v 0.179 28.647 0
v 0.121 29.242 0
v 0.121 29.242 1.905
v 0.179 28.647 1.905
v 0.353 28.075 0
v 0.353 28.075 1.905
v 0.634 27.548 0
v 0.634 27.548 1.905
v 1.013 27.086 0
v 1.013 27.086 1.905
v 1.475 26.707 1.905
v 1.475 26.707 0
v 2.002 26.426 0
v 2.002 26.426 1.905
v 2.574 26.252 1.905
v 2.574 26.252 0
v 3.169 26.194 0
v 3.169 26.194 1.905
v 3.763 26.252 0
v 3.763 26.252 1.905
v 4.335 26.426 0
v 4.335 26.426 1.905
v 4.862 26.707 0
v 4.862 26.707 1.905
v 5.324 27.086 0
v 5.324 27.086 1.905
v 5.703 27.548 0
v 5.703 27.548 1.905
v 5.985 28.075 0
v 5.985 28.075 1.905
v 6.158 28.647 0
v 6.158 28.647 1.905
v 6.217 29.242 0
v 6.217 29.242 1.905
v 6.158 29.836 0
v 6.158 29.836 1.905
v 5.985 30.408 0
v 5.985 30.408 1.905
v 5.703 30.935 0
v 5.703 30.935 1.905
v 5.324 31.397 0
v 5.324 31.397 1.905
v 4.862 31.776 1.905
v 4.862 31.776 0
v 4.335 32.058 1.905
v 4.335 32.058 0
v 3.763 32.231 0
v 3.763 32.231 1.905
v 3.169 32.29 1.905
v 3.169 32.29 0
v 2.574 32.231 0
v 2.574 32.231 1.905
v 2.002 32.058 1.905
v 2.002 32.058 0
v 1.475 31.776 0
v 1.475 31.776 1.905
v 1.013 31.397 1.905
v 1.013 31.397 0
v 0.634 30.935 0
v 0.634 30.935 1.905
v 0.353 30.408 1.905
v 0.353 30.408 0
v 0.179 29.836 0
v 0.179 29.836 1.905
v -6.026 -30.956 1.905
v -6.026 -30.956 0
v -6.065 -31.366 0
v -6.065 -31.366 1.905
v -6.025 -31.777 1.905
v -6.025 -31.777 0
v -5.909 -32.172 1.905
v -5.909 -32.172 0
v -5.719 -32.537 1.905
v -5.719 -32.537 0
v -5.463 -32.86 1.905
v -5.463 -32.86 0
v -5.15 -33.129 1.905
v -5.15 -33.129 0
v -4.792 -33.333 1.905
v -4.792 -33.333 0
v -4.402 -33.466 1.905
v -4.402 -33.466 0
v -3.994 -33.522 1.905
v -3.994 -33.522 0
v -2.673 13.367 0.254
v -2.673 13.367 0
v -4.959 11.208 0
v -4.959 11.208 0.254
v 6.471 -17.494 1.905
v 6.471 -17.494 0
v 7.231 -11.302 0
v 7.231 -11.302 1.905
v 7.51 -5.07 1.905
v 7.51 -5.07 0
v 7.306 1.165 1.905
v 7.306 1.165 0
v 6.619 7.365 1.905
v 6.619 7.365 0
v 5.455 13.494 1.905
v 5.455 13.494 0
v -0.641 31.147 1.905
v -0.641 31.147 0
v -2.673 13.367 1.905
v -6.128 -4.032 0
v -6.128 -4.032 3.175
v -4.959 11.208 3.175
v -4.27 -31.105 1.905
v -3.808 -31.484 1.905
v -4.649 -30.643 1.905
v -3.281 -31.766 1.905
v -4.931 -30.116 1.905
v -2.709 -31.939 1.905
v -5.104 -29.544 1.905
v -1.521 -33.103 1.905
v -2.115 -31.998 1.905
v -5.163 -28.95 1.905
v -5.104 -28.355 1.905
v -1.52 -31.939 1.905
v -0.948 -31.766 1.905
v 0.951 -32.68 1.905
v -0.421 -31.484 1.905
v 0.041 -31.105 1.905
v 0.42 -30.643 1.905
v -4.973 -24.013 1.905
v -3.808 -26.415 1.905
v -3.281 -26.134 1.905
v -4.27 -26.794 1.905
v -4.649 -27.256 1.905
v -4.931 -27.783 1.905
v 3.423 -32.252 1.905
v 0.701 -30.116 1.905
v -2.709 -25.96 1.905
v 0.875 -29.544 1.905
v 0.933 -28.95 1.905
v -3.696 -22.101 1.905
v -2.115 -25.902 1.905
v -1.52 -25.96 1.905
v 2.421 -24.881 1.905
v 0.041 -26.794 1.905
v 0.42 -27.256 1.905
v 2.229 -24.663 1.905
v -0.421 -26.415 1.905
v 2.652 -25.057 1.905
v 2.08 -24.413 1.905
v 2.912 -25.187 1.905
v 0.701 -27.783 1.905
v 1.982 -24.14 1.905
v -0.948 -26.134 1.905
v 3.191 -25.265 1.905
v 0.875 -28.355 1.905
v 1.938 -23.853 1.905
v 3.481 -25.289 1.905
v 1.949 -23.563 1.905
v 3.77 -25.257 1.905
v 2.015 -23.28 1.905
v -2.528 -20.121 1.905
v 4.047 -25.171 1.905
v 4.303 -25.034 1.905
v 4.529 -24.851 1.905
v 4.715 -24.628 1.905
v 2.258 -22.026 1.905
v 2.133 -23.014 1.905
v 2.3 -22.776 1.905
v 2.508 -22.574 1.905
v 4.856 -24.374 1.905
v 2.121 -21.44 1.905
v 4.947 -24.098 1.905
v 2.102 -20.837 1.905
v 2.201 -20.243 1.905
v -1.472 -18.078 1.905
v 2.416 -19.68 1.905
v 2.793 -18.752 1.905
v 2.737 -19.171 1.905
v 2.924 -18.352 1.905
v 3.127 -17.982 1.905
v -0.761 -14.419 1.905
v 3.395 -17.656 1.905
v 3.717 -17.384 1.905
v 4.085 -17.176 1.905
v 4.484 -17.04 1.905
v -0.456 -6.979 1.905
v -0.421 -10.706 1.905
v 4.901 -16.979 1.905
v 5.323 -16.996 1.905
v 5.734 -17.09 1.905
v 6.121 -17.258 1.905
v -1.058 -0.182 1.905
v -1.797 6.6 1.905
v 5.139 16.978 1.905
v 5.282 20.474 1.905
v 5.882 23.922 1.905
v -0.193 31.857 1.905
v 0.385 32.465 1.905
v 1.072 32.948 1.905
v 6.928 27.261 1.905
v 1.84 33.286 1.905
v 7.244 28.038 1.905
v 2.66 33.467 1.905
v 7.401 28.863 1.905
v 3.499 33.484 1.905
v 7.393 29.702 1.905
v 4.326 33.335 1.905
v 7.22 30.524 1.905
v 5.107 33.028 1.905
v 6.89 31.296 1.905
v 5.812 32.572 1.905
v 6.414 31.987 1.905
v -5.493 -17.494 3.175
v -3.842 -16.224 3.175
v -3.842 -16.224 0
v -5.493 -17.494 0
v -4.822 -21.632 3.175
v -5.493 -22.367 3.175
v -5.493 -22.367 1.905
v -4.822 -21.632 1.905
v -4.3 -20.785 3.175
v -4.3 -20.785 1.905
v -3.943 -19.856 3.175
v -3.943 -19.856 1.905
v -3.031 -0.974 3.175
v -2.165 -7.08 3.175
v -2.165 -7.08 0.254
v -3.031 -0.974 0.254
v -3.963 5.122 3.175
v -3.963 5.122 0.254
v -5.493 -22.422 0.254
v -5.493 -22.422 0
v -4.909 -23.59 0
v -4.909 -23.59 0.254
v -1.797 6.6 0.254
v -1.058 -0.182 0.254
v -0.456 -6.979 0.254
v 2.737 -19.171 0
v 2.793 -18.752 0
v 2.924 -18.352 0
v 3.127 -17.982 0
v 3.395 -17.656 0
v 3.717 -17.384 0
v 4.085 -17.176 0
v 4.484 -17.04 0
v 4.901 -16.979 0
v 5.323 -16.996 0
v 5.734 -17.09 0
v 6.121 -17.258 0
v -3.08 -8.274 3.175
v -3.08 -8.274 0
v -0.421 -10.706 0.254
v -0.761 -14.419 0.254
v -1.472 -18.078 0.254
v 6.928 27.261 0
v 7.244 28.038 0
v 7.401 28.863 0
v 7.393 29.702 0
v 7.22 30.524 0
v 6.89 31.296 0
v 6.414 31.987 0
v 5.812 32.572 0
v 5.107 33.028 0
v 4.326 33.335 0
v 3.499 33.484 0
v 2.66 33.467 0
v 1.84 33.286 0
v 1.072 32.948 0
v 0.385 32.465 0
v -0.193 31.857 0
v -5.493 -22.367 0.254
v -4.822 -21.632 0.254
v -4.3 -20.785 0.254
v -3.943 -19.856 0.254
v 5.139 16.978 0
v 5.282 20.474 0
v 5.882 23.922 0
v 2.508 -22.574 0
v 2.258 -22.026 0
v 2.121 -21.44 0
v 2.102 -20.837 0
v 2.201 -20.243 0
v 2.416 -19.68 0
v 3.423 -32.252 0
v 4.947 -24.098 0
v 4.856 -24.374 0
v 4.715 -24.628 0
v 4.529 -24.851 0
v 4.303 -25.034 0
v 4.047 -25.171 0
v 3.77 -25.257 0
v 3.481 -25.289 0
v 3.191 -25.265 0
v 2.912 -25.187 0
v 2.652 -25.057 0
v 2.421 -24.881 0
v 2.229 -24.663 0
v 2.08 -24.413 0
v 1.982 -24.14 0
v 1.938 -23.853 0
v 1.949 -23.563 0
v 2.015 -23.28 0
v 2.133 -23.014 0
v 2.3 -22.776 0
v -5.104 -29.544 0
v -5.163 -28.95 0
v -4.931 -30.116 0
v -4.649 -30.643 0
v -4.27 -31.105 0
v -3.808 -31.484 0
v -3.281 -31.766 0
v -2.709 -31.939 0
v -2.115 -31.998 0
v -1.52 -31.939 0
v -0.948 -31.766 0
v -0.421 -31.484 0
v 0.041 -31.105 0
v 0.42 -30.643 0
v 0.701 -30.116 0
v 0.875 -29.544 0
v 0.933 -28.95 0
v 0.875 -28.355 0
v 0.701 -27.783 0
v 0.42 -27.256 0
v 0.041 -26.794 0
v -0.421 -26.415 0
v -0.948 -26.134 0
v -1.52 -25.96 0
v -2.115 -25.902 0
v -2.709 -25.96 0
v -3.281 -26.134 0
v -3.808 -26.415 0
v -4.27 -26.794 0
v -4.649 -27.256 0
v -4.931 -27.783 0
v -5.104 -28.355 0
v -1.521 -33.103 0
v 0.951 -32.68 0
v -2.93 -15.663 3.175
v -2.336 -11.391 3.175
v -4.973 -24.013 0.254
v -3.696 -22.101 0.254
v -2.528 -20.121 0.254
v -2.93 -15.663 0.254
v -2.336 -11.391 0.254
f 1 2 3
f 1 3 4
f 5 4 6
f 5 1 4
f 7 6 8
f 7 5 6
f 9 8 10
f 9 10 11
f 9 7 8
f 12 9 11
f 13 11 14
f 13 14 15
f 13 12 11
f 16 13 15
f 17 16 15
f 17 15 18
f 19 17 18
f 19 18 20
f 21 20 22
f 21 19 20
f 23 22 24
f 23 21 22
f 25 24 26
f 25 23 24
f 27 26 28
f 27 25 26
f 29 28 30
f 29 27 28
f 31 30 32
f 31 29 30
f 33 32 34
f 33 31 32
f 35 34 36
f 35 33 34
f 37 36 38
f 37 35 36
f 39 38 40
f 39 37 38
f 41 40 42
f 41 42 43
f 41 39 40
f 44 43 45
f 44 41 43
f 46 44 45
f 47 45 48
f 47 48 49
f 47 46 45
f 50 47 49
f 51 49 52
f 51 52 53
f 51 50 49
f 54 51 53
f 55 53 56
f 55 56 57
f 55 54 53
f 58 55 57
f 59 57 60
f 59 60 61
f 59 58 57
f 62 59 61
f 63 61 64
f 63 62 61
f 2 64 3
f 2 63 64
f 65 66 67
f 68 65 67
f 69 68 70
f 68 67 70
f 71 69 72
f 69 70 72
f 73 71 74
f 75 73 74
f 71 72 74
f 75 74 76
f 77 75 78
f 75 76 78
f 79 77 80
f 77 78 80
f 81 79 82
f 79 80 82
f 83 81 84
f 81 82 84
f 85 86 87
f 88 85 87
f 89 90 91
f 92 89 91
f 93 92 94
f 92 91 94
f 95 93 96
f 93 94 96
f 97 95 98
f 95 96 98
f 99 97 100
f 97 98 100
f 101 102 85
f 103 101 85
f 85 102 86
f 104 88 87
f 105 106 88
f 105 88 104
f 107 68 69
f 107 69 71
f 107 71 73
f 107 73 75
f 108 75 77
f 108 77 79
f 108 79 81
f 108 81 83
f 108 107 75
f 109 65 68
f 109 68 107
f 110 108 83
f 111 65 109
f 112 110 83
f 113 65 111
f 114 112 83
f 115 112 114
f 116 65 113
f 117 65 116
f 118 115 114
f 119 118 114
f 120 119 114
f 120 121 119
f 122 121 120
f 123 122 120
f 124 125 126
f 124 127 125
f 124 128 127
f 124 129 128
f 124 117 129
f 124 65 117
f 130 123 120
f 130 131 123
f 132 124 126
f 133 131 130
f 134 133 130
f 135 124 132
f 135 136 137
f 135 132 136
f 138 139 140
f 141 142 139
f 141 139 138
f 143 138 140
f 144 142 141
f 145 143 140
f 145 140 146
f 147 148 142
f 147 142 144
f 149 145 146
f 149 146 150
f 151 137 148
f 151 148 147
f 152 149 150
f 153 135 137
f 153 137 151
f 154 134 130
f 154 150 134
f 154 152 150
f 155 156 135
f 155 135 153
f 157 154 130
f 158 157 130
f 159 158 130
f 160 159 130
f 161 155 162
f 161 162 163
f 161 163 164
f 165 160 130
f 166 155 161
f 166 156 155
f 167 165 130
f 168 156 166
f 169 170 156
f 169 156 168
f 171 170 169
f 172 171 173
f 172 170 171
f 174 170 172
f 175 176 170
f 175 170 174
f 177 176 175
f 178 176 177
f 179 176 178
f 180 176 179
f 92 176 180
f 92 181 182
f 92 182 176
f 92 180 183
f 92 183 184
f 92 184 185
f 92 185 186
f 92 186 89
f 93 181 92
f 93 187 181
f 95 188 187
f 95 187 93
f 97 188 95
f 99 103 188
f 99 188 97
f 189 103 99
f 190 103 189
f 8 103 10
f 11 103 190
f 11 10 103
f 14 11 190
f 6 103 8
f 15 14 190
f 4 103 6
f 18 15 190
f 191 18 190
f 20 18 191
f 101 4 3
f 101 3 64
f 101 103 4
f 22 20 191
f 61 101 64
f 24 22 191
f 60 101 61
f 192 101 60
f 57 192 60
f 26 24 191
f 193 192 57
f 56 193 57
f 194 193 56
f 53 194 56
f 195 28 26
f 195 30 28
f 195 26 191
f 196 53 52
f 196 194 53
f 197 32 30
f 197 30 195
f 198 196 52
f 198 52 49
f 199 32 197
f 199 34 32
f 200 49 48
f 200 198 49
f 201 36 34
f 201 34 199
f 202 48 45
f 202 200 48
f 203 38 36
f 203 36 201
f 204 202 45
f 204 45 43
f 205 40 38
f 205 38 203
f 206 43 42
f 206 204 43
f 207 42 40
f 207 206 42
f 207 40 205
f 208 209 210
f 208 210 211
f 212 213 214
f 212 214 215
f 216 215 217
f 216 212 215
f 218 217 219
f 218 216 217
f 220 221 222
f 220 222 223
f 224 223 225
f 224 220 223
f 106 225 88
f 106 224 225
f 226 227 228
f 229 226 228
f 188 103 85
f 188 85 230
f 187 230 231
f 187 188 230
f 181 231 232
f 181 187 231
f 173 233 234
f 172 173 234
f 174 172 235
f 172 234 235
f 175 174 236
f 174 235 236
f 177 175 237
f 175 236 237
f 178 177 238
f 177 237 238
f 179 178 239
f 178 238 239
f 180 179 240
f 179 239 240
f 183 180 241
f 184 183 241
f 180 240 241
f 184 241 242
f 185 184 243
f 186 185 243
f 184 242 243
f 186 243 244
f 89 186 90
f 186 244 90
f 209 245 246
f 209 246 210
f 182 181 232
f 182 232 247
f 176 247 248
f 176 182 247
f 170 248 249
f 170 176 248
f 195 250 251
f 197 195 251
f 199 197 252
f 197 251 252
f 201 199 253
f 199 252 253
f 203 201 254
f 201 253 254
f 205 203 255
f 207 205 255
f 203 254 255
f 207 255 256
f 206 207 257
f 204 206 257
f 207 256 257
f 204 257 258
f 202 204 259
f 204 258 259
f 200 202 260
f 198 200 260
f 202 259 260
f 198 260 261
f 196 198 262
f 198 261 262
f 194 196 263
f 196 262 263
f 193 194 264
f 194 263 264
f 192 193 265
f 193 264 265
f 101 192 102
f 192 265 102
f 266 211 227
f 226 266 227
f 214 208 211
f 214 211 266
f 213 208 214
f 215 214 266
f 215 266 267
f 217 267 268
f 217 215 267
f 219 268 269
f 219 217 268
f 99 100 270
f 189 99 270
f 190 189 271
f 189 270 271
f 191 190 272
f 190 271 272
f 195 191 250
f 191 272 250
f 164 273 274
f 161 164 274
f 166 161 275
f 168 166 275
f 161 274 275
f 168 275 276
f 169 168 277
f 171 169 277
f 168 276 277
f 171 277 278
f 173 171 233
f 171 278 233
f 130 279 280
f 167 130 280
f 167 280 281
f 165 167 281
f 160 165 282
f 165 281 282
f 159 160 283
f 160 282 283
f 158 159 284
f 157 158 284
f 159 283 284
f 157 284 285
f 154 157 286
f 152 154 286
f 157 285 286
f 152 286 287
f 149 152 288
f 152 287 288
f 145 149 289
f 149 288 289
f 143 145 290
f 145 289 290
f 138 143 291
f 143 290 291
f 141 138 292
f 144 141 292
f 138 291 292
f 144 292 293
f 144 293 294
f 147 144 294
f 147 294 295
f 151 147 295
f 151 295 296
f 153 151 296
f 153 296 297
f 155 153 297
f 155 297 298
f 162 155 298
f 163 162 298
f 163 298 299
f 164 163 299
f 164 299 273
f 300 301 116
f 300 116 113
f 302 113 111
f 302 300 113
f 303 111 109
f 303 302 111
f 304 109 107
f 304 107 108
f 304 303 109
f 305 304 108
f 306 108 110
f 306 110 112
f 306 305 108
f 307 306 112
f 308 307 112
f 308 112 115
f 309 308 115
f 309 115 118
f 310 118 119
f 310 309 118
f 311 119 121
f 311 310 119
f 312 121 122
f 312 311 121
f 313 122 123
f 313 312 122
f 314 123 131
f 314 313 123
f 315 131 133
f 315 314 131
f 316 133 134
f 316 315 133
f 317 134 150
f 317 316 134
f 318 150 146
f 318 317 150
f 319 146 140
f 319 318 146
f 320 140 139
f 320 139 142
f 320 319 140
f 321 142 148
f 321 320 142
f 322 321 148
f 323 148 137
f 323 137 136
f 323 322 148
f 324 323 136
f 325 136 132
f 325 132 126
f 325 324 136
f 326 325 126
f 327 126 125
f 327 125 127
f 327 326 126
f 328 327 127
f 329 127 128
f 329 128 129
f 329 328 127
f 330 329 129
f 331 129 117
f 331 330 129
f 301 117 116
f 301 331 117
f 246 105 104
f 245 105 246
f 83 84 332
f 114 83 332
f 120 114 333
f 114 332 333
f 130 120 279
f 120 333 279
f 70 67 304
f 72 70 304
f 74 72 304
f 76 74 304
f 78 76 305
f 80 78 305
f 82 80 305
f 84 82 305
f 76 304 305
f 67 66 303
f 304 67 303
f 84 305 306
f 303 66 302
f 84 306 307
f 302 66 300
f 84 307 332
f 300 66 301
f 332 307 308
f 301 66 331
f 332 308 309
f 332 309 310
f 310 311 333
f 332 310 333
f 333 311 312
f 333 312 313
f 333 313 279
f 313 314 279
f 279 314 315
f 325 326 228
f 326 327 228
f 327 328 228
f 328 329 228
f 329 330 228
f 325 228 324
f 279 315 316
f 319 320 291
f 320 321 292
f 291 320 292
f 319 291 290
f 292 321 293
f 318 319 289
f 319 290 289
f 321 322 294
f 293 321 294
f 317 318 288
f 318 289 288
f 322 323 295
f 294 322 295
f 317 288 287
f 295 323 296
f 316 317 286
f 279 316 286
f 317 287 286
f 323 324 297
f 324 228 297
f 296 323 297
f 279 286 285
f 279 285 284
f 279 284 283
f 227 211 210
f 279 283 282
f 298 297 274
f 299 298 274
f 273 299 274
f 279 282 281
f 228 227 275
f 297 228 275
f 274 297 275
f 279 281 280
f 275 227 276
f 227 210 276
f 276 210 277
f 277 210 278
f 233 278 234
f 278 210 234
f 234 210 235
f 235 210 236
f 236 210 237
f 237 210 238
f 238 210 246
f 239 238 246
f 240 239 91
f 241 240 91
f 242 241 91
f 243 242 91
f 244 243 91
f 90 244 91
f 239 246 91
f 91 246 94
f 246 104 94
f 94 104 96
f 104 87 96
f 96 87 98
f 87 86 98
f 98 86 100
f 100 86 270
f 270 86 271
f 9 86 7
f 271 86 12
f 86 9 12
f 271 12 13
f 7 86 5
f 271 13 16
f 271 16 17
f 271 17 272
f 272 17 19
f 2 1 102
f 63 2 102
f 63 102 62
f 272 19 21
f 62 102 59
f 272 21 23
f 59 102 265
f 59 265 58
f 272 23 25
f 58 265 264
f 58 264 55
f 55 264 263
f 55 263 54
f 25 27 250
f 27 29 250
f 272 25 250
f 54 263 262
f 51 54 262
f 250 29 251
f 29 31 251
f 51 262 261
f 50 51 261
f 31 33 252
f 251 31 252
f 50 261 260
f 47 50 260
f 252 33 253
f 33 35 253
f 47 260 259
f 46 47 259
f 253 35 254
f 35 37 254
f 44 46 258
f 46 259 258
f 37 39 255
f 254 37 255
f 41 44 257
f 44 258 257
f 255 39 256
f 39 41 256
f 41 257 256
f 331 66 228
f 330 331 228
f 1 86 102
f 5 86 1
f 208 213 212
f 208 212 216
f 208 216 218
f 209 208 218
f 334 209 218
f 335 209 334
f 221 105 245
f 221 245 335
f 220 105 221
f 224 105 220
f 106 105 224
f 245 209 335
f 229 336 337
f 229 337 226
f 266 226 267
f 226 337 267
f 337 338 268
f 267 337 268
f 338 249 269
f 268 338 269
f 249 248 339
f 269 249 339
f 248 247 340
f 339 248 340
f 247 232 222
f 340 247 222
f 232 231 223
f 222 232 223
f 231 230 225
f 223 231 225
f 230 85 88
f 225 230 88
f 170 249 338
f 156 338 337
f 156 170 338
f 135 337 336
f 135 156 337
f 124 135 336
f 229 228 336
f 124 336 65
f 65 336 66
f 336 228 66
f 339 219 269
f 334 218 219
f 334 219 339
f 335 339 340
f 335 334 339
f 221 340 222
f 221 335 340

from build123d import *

# Parameters (mm, degrees)
SKETCH1_R           = 3.048
BOSS_EXTRUDE1_DEPTH = 1.905
CUT_EXTRUDE1_DEPTH  = 1.651
BOSS_EXTRUDE2_START = 1.27
BOSS_EXTRUDE2_DEPTH = 1.27


with BuildPart() as part:
    # Sketch1 → Boss-Extrude1 (new body)
    with BuildSketch(Plane.XY):
        with BuildLine():
            Line((-5.49275, -17.49425), (-5.49275, -22.42185))
            Line((-5.49275, -22.42185), (-4.90855, -23.59025))
            Line((-4.90855, -23.59025), (-6.02615, -30.95625))
            ThreePointArc((-6.02615, -30.95625), (-5.598504604, -32.704973448), (-3.99415, -33.52165))
            ThreePointArc((-3.99415, -33.52165), (-0.284785682, -32.892281616), (3.42265, -32.25165))
            Line((3.42265, -32.25165), (4.94665, -24.09825))
            ThreePointArc((4.94665, -24.09825), (2.651841734, -25.057223226), (2.50825, -22.57425))
            ThreePointArc((2.50825, -22.57425), (2.10181036, -20.83747495), (2.73685, -19.17065))
            ThreePointArc((2.73685, -19.17065), (4.08470653, -17.176398636), (6.47065, -17.49425))
            ThreePointArc((6.47065, -17.49425), (7.46828342, -1.95088497), (5.45465, 13.49375))
            ThreePointArc((5.45465, 13.49375), (5.282315002, 20.474416107), (6.92785, 27.26055))
            ThreePointArc((6.92785, 27.26055), (5.106547792, 33.02758949), (-0.64135, 31.14675))
            Line((-0.64135, 31.14675), (-2.67335, 13.36675))
            Line((-2.67335, 13.36675), (-4.95935, 11.20775))
            Line((-4.95935, 11.20775), (-6.12775, -4.03225))
            Line((-6.12775, -4.03225), (-3.07975, -8.27405))
            Line((-3.07975, -8.27405), (-3.84175, -16.22425))
            Line((-3.84175, -16.22425), (-5.49275, -17.49425))
        make_face()
        with Locations(Location((3.16865, 29.24175, 0), (0, 0, 180))):
            Circle(SKETCH1_R, mode=Mode.SUBTRACT)
        with Locations(Location((-2.11455, -28.94965, 0), (0, 0, 180))):
            Circle(SKETCH1_R, mode=Mode.SUBTRACT)
    extrude(amount=BOSS_EXTRUDE1_DEPTH)

    # Sketch2 → Cut-Extrude1 (cut)
    with BuildSketch(Plane.XY.offset(1.905)):
        with BuildLine():
            Line((-7.059940767, -26.71445), (-7.49935, -23.51405))
            ThreePointArc((-7.49935, -23.51405), (-5.25575534, -22.137911475), (-3.94335, -19.85645))
            ThreePointArc((-3.94335, -19.85645), (-2.580214562, -13.534333063), (-2.16535, -7.08025))
            ThreePointArc((-2.16535, -7.08025), (-3.488996471, 2.074956789), (-4.95935, 11.20775))
            Line((-4.95935, 11.20775), (-2.67335, 13.36675))
            ThreePointArc((-2.67335, 13.36675), (-1.409957084, 3.210909205), (-0.455940767, -6.97865))
            ThreePointArc((-0.455940767, -6.97865), (-0.544530874, -12.566939921), (-1.471940767, -18.07845))
            ThreePointArc((-1.471940767, -18.07845), (-3.99586421, -22.571205419), (-7.059940767, -26.71445))
        make_face()
    extrude(amount=-CUT_EXTRUDE1_DEPTH, mode=Mode.SUBTRACT)

    # Sketch3 → Boss-Extrude2 (add)
    with BuildSketch(Plane.XY.offset(1.905).offset(BOSS_EXTRUDE2_START)):
        with BuildLine():
            Line((-5.49275, -17.49425), (-5.49275, -22.367063276))
            ThreePointArc((-5.49275, -22.367063276), (-4.541021091, -21.221008268), (-3.94335, -19.85645))
            ThreePointArc((-3.94335, -19.85645), (-2.580214562, -13.534333063), (-2.16535, -7.08025))
            ThreePointArc((-2.16535, -7.08025), (-3.488996471, 2.074956789), (-4.95935, 11.20775))
            Line((-4.95935, 11.20775), (-6.12775, -4.03225))
            Line((-6.12775, -4.03225), (-3.07975, -8.27405))
            Line((-3.07975, -8.27405), (-3.84175, -16.22425))
            Line((-3.84175, -16.22425), (-5.49275, -17.49425))
        make_face()
    extrude(amount=-BOSS_EXTRUDE2_DEPTH)


solid = part.part
